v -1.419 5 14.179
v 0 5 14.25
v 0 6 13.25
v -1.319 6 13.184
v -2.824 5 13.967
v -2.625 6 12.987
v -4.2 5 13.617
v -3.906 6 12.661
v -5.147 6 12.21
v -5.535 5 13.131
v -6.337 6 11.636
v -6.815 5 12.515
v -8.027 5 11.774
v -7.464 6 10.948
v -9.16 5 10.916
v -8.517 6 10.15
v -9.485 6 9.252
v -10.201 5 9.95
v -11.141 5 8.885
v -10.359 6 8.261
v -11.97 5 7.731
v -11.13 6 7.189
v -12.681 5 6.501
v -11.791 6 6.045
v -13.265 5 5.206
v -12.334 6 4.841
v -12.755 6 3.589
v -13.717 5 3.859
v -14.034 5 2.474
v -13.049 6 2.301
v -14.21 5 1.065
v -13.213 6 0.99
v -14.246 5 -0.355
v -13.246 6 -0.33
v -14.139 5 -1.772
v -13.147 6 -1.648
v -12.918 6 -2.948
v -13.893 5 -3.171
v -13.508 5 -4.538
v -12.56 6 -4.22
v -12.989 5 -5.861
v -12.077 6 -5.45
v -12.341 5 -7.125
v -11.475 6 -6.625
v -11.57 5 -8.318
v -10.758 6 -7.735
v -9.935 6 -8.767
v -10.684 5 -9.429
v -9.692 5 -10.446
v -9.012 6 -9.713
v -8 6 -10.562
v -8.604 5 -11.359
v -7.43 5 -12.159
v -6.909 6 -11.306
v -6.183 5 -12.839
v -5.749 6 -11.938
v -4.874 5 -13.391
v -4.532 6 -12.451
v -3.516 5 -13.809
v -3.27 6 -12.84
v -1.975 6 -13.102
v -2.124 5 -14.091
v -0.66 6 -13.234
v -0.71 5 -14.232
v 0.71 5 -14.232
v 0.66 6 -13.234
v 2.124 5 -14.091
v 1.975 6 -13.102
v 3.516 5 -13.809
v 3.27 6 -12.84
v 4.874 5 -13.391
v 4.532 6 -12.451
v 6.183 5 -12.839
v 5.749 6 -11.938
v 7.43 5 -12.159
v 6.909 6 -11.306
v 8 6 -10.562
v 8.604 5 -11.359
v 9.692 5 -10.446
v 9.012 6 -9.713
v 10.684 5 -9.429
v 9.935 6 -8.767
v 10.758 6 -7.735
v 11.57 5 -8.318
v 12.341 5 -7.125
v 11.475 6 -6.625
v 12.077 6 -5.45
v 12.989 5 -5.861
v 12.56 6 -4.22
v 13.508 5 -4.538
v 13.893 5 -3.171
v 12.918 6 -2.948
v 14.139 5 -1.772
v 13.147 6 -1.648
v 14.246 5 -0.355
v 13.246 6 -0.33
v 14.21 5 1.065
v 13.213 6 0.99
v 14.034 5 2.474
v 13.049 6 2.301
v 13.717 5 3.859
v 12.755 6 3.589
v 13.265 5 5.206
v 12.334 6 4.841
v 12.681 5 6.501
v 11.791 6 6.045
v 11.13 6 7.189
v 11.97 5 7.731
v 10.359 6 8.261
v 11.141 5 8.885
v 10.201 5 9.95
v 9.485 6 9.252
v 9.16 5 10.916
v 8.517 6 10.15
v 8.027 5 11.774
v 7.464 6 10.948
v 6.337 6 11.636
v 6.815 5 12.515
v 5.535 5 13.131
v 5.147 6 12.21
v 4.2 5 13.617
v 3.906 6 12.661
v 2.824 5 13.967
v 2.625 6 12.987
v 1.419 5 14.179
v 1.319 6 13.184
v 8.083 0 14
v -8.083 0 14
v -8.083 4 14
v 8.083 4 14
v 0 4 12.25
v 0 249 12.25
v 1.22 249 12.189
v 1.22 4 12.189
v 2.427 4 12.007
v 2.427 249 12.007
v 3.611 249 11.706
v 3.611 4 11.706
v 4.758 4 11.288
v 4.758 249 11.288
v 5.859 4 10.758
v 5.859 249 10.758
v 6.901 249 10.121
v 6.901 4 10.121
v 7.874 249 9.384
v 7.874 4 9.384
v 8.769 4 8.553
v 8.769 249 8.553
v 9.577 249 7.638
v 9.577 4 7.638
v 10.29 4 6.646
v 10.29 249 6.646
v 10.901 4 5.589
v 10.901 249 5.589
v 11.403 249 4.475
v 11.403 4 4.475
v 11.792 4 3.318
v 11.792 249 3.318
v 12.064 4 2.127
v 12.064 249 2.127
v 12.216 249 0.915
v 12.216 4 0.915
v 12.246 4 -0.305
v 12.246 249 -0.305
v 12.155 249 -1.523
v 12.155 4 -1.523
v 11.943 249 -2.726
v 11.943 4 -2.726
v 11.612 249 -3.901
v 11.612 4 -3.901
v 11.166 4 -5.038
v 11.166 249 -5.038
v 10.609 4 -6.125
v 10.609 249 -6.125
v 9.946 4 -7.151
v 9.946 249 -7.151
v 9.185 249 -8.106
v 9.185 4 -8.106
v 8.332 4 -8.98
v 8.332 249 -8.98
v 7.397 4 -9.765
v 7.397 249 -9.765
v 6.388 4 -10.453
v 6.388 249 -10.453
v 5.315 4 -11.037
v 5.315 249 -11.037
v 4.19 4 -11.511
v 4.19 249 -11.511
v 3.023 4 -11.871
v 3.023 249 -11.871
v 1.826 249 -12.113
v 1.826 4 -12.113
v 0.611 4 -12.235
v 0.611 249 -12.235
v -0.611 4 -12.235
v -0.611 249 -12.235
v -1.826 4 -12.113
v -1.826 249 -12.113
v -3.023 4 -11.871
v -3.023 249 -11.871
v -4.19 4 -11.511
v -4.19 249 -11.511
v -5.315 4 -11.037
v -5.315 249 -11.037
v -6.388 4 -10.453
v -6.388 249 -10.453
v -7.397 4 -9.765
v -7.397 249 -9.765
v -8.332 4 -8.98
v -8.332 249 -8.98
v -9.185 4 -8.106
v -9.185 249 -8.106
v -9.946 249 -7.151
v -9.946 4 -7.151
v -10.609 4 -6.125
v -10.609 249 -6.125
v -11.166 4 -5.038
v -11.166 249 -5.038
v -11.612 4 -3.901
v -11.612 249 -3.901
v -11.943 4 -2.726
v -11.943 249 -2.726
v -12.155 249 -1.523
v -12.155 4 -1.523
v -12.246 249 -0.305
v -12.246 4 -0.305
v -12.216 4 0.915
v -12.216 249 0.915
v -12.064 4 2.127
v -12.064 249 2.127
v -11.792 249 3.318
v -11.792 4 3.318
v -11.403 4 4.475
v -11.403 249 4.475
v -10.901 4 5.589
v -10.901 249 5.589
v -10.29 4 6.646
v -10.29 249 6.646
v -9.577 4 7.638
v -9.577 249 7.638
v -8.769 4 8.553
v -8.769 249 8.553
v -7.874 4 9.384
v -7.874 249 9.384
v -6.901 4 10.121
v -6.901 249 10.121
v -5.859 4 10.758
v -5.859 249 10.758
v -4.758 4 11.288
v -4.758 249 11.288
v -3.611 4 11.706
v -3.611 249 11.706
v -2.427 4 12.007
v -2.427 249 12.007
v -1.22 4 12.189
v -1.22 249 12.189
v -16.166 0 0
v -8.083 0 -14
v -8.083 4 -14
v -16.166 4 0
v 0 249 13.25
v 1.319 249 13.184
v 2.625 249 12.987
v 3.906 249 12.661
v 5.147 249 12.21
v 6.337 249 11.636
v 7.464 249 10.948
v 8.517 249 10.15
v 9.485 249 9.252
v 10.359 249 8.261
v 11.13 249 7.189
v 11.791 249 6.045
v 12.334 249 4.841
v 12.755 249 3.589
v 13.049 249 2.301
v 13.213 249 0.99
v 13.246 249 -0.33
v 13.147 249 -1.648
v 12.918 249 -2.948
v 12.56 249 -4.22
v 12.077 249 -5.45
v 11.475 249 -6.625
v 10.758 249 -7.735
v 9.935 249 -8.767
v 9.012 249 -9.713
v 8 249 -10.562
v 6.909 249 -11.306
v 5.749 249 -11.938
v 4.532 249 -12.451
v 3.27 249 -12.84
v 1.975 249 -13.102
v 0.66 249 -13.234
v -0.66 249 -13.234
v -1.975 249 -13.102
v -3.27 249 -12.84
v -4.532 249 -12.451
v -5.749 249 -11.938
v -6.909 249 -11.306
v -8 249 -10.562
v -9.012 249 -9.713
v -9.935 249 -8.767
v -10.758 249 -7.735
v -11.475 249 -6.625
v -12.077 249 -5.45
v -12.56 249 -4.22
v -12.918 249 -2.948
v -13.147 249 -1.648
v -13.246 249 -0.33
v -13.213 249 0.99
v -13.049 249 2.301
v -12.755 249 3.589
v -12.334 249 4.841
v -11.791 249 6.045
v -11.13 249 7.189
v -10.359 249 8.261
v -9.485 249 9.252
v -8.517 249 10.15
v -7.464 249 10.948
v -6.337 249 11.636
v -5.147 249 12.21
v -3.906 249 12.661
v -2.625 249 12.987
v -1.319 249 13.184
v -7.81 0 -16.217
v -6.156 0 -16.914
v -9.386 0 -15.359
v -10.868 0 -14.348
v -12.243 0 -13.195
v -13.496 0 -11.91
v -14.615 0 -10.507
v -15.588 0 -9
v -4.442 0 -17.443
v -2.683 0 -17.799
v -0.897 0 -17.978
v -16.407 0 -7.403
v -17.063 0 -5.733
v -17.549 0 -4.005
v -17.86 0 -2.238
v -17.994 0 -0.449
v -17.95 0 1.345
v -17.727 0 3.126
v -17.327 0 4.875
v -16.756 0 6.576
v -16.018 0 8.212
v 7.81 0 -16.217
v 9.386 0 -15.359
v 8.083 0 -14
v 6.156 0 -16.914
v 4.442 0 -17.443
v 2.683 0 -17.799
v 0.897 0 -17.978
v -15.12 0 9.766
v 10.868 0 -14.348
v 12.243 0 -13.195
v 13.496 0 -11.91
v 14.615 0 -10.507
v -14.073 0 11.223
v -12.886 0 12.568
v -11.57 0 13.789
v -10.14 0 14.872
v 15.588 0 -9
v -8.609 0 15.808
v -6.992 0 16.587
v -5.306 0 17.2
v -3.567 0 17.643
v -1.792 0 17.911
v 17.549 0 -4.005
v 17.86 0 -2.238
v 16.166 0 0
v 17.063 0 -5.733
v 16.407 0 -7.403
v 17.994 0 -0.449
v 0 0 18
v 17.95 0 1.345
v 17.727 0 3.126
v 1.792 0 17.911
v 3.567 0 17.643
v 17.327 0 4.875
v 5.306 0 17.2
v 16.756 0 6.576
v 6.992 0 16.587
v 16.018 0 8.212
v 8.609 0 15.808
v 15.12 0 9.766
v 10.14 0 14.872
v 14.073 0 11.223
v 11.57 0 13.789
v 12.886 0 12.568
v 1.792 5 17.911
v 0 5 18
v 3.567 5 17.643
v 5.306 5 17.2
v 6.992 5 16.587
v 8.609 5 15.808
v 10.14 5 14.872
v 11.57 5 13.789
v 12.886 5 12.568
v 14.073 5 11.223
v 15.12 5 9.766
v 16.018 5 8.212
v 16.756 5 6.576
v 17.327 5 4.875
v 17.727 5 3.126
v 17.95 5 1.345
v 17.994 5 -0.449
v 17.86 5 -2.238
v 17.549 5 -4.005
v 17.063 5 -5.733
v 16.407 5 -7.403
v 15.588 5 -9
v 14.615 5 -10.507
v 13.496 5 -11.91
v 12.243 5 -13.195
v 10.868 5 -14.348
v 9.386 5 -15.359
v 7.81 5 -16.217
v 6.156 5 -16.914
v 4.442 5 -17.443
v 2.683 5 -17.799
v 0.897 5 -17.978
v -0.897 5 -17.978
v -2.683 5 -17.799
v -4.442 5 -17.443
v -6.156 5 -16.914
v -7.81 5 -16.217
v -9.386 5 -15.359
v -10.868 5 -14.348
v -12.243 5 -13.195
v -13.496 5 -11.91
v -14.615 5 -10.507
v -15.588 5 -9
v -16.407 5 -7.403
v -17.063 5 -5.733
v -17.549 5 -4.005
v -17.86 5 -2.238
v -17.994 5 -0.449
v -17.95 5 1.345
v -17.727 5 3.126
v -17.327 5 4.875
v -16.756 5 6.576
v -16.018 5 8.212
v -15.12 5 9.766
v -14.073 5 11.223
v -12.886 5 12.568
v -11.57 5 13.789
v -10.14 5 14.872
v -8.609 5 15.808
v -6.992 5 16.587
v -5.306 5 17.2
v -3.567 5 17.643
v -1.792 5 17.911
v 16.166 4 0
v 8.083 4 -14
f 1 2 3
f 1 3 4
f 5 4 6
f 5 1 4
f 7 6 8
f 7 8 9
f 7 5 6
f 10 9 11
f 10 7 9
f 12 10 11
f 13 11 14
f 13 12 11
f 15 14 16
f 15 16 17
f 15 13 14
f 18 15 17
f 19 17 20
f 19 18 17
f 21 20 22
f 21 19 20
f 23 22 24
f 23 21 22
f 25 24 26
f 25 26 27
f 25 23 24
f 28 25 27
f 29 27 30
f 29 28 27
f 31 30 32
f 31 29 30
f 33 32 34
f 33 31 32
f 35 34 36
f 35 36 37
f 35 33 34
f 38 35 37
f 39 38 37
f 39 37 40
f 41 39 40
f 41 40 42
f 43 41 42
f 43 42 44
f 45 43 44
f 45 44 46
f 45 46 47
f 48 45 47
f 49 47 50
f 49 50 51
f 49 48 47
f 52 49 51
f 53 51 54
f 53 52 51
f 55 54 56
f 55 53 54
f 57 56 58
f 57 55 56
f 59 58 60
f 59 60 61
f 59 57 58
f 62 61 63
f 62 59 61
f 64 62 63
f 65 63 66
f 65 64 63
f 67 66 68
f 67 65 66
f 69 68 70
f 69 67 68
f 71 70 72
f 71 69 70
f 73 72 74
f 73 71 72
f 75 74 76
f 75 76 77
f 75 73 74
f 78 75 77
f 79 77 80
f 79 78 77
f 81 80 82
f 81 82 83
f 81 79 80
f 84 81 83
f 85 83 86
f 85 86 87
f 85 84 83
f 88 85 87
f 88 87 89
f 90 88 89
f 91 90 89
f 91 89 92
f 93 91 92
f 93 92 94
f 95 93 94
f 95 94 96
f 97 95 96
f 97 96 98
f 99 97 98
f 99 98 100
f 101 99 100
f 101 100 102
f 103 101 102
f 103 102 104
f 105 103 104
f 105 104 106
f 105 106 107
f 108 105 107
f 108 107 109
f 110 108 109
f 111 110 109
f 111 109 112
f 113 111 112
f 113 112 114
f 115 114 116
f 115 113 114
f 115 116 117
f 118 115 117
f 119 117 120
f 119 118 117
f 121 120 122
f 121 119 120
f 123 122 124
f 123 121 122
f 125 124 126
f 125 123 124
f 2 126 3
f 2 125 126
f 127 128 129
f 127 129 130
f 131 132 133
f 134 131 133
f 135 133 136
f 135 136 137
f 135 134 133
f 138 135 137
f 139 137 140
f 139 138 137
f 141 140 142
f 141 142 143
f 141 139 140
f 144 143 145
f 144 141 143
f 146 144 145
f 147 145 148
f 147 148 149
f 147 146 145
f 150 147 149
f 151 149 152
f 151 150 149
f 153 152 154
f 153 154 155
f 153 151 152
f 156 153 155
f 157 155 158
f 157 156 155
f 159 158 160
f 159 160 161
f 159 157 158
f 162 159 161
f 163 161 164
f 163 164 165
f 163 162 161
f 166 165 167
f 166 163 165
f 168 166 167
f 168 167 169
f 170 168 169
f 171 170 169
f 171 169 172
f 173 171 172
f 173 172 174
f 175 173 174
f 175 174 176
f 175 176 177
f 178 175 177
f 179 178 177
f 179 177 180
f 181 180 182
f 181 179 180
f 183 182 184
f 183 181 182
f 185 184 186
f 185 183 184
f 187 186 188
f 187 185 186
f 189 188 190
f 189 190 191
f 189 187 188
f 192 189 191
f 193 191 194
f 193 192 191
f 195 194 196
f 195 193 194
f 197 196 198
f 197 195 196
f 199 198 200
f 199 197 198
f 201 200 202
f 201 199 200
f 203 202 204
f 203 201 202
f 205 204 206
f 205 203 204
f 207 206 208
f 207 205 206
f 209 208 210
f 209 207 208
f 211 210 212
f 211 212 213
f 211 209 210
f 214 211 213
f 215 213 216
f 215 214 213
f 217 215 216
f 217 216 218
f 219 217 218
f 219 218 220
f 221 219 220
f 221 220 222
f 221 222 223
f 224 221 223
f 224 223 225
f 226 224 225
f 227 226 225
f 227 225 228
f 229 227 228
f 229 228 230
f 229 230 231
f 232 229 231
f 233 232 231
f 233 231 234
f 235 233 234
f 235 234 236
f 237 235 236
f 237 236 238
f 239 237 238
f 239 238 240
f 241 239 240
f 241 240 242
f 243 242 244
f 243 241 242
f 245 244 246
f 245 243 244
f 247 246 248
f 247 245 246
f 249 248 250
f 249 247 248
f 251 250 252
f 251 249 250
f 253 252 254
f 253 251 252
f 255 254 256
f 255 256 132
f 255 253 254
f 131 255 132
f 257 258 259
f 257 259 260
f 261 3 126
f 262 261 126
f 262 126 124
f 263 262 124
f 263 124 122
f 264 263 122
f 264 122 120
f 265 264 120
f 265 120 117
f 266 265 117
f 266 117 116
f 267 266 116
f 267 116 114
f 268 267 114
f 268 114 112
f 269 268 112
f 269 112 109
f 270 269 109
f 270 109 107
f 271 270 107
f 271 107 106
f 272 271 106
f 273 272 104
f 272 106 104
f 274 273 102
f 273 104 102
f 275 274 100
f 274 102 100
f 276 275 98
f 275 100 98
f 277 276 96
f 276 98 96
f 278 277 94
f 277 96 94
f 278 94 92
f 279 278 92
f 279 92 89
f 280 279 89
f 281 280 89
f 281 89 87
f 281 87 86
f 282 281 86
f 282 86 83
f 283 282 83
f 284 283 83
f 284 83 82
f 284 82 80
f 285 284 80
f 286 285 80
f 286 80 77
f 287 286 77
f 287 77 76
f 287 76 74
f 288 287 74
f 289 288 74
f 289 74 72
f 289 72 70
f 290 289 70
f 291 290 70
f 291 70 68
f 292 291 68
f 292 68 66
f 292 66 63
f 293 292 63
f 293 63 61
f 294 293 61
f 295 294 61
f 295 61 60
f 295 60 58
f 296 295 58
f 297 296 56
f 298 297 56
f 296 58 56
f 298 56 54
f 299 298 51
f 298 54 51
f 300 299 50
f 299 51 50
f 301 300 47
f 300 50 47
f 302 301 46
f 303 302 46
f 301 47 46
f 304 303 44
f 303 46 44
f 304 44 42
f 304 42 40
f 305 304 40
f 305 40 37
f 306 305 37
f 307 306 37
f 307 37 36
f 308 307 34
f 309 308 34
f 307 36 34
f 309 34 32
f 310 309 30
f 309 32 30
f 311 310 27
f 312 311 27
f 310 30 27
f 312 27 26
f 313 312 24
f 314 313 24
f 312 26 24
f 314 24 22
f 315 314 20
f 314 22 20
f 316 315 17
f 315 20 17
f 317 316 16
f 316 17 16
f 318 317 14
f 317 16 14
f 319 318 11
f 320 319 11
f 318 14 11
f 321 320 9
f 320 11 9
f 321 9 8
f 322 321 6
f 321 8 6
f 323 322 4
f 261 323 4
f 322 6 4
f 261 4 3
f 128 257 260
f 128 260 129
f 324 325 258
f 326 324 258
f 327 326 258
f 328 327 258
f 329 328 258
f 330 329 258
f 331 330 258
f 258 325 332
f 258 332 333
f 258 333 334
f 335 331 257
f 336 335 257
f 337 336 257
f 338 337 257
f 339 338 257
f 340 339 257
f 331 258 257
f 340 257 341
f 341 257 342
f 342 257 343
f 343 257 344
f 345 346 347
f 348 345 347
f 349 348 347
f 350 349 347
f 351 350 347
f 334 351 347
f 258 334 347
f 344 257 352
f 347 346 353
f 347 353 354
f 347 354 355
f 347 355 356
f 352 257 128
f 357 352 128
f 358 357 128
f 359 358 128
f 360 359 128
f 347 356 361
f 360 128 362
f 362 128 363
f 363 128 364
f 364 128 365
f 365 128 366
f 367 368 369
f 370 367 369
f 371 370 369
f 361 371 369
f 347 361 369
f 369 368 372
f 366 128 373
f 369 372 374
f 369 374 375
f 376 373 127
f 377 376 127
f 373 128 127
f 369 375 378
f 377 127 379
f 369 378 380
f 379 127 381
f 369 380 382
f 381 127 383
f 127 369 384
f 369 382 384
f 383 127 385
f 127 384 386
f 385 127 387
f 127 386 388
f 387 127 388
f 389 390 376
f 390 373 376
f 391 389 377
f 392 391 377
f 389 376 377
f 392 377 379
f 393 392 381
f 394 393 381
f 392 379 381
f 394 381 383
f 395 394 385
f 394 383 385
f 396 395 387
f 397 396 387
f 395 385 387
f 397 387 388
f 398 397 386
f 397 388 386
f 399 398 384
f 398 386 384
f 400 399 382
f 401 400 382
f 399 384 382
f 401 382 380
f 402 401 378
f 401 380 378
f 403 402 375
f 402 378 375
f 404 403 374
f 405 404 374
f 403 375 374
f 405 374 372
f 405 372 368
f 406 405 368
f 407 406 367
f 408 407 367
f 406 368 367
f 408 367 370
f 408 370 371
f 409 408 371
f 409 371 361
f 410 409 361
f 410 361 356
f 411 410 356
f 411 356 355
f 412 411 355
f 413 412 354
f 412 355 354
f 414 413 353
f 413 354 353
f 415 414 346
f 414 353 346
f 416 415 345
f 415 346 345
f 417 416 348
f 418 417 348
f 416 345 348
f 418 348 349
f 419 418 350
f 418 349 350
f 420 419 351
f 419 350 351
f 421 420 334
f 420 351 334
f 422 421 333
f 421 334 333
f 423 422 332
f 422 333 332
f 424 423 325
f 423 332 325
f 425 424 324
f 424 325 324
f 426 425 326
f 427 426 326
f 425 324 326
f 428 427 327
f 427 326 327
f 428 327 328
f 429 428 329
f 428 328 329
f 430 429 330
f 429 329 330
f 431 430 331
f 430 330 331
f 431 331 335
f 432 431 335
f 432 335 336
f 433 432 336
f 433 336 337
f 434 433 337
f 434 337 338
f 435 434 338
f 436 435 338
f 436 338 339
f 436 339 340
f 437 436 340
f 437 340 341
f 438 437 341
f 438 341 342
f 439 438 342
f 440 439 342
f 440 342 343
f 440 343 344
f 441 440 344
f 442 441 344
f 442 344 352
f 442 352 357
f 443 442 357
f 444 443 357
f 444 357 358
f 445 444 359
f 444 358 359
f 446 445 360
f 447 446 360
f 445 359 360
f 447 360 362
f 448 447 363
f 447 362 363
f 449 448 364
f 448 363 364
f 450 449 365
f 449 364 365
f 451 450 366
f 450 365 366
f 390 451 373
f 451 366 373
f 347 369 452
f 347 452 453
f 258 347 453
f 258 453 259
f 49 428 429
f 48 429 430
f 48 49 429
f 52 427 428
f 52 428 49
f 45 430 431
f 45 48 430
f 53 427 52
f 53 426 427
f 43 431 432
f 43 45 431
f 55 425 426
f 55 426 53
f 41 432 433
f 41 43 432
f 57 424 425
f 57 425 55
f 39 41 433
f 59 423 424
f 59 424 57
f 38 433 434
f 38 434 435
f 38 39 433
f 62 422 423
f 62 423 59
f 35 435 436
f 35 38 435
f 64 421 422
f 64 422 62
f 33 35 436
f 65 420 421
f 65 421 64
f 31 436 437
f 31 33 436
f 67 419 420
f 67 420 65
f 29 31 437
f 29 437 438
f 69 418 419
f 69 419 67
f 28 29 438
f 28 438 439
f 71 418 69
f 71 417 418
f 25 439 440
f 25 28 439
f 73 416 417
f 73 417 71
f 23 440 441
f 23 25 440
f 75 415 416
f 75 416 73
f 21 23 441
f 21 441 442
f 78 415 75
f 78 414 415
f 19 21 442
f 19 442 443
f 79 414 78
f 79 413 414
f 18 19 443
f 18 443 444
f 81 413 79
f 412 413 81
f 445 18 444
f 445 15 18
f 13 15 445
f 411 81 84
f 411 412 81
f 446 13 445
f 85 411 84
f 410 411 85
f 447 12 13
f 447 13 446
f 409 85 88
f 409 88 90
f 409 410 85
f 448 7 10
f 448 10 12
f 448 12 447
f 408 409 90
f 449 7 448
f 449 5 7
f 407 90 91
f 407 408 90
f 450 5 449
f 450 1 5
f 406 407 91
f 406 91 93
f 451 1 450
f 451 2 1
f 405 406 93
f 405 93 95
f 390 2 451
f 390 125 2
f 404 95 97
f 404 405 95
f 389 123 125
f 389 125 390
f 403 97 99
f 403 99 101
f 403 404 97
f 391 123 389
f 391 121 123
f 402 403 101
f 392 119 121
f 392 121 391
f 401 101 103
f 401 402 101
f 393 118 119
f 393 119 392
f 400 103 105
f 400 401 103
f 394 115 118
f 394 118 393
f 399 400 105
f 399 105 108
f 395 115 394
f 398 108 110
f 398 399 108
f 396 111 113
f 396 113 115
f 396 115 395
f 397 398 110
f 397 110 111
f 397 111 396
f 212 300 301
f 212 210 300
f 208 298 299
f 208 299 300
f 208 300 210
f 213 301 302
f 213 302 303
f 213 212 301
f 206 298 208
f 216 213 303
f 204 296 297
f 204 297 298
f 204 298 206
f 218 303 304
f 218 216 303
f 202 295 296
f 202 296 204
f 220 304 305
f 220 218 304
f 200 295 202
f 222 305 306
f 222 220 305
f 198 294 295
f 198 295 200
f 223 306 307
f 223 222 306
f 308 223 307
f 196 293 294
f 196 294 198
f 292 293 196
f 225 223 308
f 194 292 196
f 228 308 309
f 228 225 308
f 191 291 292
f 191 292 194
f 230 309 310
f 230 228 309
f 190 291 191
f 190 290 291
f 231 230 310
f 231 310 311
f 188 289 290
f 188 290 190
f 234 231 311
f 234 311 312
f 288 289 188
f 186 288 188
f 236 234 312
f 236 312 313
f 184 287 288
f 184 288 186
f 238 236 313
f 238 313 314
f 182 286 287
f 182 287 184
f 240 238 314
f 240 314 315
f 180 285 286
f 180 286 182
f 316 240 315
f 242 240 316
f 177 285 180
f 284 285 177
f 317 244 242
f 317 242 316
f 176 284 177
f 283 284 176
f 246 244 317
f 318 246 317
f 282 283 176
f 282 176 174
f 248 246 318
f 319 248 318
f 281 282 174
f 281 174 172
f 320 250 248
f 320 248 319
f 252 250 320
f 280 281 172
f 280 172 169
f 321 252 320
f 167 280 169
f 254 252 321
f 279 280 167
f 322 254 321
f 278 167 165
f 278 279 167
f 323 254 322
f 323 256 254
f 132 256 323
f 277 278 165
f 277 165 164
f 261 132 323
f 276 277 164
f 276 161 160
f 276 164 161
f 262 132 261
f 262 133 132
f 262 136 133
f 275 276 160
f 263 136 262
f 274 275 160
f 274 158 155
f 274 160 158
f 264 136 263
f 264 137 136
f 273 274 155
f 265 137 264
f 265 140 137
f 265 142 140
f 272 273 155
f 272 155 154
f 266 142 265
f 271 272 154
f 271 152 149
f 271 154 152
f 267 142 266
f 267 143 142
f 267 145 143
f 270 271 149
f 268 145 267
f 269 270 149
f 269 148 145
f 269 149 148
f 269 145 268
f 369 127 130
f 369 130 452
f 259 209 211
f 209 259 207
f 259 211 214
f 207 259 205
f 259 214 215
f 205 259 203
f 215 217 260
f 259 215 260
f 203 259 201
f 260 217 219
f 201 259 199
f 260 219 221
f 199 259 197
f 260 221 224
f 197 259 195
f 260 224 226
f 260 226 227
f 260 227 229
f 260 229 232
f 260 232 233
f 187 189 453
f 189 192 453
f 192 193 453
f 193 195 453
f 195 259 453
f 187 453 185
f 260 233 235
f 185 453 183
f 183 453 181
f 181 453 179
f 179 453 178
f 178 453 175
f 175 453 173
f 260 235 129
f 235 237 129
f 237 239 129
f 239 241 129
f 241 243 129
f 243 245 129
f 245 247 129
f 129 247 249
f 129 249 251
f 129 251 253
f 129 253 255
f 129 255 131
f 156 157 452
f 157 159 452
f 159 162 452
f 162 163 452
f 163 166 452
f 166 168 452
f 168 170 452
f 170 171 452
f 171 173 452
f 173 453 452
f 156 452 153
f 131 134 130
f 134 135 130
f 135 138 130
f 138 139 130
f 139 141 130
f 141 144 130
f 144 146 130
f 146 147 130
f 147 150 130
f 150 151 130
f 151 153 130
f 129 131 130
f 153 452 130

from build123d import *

# Parameters (mm, degrees)
SKETCH1_R           = 18
BOSS_EXTRUDE1_DEPTH = 4
SKETCH2_R           = 13.25
SKETCH2_R_2         = 12.25
BOSS_EXTRUDE2_DEPTH = 245
SKETCH3_R           = 18
SKETCH3_R_2         = 12.25
BOSS_EXTRUDE3_DEPTH = 1
CHAMFER1_SIZE       = 1


with BuildPart() as part:
    # Sketch1 → Boss-Extrude1 (new body)
    with BuildSketch(Plane(origin=(0, 0, 0), x_dir=(1, 0, 0), z_dir=(0, 1, 0))):
        with Locations(Location((0, 0, 0), (0, 0, 270))):
            Circle(SKETCH1_R)
        Polygon((8.082903769, -14), (16.165807537, 0), (8.082903769, 14), (-8.082903769, 14), (-16.165807537, 0), (-8.082903769, -14), align=None, mode=Mode.SUBTRACT)
    extrude(amount=BOSS_EXTRUDE1_DEPTH)



with BuildPart() as body_2:
    # Sketch2 → Boss-Extrude2 (new body)
    with BuildSketch(Plane(origin=(0, 4, 0), x_dir=(1, 0, 0), z_dir=(0, 1, 0))):
        with Locations(Location((0, 0, 0), (0, 0, 270))):
            Circle(SKETCH2_R)
        with Locations(Location((0, 0, 0), (0, 0, 270))):
            Circle(SKETCH2_R_2, mode=Mode.SUBTRACT)
    extrude(amount=BOSS_EXTRUDE2_DEPTH)


with BuildPart() as part_1:
    add(part.part)

    add(body_2.part)  # Boss-Extrude3 merges body 2
    # Sketch3 → Boss-Extrude3 (add)
    with BuildSketch(Plane(origin=(0, 4, 0), x_dir=(1, 0, 0), z_dir=(0, 1, 0))):
        with Locations(Location((0, 0, 0), (0, 0, 270))):
            Circle(SKETCH3_R)
        with Locations(Location((0, 0, 0), (0, 0, 270))):
            Circle(SKETCH3_R_2, mode=Mode.SUBTRACT)
    extrude(amount=BOSS_EXTRUDE3_DEPTH)

    # Chamfer1
    chamfer1_edges = [part_1.edges().sort_by_distance(p)[0] for p in [
        (0, 5, -13.25),
    ]]
    chamfer(chamfer1_edges, length=CHAMFER1_SIZE)


solid = part_1.part
